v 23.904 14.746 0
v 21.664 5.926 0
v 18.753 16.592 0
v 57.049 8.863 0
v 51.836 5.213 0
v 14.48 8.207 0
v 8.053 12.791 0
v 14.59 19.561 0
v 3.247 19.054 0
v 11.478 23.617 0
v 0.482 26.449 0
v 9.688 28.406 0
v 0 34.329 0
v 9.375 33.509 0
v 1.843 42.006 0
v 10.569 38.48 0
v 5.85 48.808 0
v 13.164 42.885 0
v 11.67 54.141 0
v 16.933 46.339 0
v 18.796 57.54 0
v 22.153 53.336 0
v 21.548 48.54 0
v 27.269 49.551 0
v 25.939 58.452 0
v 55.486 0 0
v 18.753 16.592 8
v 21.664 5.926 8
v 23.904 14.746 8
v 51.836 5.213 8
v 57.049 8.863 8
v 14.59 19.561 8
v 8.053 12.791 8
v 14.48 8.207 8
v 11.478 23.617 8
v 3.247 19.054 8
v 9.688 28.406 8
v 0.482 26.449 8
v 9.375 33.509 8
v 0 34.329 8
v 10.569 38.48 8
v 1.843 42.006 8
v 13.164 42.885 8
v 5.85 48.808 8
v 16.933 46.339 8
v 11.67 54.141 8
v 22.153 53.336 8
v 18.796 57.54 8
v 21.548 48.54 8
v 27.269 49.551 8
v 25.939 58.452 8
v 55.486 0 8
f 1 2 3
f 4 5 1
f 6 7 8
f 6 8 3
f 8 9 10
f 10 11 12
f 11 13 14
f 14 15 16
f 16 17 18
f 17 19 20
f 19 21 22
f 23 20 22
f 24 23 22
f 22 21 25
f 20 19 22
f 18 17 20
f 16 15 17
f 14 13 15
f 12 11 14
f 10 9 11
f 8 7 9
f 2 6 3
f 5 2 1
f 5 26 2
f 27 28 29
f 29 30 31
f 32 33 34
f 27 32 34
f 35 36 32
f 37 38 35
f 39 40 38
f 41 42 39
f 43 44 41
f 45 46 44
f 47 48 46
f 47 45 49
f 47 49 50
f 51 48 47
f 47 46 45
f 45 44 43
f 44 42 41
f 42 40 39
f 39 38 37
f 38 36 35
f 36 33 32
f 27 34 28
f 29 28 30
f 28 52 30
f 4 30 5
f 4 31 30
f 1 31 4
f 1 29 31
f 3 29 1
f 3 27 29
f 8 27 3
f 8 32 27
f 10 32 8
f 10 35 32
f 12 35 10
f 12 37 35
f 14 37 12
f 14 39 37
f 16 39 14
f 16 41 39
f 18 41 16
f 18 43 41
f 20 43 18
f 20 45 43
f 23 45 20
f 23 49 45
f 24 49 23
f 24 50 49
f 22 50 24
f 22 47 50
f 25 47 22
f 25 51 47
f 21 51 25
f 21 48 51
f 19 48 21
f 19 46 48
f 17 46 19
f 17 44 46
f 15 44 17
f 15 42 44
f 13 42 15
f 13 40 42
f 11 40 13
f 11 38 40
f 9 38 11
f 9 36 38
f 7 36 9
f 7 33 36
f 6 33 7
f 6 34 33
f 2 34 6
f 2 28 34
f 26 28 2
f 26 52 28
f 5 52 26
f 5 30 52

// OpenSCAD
$fn = 32;

// ----------------------------------------------------------------------
// Hook plate: curl radius 22 mm over 170 degrees, 9 mm thick band
// ----------------------------------------------------------------------

// --- parameters (mm) ---
profile_height = 8;       // extrusion height
profile_points = 26;      // points of the closed outline

profile = [[22.153, 53.336], [25.939, 58.452], [18.796, 57.54], [11.67, 54.141], [5.85, 48.808], [1.843, 42.006], [0, 34.329], [0.482, 26.449], [3.247, 19.054], [8.053, 12.791], [14.48, 8.207], [21.664, 5.926], [55.486, 0], [51.836, 5.213], [57.049, 8.863], [23.904, 14.746], [18.753, 16.592], [14.59, 19.561], [11.478, 23.617], [9.688, 28.406], [9.375, 33.509], [10.569, 38.48], [13.164, 42.885], [16.933, 46.339], [21.548, 48.54], [27.269, 49.551]];  // single closed polygon, 26 points, counter clockwise

// --- the one profile operation ---
linear_extrude(height = profile_height) polygon(points = profile);
